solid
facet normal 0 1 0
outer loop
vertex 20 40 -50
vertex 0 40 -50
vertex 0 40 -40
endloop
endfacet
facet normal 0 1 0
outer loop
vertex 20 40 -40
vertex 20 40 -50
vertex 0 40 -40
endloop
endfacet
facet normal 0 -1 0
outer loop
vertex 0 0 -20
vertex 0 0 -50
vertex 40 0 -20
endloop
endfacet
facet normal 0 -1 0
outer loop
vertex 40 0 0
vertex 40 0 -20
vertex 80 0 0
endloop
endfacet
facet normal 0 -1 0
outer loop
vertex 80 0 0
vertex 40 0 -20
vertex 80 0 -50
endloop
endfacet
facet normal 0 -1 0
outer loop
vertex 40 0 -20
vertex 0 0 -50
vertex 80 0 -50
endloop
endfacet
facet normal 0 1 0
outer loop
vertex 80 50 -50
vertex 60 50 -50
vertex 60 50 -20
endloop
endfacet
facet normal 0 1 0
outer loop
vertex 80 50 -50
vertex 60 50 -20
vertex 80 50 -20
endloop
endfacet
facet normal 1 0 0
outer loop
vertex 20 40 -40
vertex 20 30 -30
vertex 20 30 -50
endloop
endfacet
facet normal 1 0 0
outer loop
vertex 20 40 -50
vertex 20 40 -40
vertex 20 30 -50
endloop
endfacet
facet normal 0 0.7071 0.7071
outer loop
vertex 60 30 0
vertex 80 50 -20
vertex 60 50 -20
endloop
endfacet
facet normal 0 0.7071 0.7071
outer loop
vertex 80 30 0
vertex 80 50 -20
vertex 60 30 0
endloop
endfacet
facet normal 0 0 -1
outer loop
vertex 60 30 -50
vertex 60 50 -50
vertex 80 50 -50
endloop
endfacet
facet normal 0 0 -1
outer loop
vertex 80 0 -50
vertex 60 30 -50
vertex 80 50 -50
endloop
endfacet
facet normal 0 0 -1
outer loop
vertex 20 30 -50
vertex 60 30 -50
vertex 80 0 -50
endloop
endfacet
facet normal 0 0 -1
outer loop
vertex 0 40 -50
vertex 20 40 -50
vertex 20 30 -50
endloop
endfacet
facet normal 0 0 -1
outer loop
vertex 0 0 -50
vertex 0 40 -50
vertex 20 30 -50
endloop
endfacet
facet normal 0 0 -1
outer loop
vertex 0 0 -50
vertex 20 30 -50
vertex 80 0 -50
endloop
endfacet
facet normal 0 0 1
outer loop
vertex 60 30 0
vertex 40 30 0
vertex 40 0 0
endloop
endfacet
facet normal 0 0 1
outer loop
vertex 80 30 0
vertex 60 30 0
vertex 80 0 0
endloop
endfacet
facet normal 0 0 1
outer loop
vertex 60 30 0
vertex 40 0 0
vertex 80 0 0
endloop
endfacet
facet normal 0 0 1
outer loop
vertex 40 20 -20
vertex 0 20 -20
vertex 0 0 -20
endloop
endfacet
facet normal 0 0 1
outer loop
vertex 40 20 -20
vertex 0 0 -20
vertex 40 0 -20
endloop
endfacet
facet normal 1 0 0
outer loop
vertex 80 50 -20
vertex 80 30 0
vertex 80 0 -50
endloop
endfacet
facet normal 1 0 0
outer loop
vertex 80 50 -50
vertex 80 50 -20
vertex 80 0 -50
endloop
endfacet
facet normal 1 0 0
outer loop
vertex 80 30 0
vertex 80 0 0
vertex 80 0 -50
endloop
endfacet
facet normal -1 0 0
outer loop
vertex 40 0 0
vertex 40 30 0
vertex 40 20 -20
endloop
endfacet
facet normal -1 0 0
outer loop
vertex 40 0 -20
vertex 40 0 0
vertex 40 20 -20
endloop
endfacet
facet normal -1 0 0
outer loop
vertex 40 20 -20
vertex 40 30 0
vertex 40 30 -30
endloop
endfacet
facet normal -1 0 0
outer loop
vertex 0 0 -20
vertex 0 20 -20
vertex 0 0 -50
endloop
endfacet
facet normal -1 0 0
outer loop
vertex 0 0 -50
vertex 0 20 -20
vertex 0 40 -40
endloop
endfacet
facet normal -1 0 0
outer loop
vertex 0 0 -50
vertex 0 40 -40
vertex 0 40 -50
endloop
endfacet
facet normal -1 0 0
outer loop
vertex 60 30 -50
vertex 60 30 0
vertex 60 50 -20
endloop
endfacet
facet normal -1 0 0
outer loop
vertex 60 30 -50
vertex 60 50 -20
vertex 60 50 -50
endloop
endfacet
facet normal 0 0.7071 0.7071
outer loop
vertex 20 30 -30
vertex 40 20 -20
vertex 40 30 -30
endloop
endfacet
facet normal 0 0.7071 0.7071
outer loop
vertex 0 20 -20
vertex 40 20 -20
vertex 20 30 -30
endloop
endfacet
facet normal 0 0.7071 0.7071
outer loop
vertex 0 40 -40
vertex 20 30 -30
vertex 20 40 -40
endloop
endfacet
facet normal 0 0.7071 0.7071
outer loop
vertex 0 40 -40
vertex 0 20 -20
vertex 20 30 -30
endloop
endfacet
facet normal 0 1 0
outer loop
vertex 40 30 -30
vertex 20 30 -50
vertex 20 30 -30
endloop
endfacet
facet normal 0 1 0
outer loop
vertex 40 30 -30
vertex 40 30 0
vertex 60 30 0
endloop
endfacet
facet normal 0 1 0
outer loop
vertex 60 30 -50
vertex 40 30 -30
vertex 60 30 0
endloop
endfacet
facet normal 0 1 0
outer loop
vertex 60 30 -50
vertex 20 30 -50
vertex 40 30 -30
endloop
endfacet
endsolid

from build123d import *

# Parameters (mm, degrees)
SKETCH1_W           = 80
SKETCH1_H           = 50
BOSS_EXTRUDE1_DEPTH = 30
SKETCH2_W           = 40
SKETCH2_H           = 20
CUT_EXTRUDE1_DEPTH  = 30
SKETCH3_W           = 20
SKETCH3_H           = 50
BOSS_EXTRUDE2_DEPTH = 20
CUT_EXTRUDE2_DEPTH  = 20
CUT_EXTRUDE4_DEPTH  = 40
BOSS_EXTRUDE3_DEPTH = 20


with BuildPart() as part:
    # Sketch1 → Boss-Extrude1 (new body)
    with BuildSketch(Plane(origin=(0, 0, 0), x_dir=(1, 0, 0), z_dir=(0, 1, 0))):
        with Locations((40, 25)):
            Rectangle(SKETCH1_W, SKETCH1_H)
    extrude(amount=BOSS_EXTRUDE1_DEPTH)

    # Sketch2 → Cut-Extrude1 (cut)
    with BuildSketch(Plane(origin=(0, 30, 0), x_dir=(1, 0, 0), z_dir=(0, 1, 0))):
        with Locations((20, 10)):
            Rectangle(SKETCH2_W, SKETCH2_H)
    extrude(amount=-CUT_EXTRUDE1_DEPTH, mode=Mode.SUBTRACT)

    # Sketch3 → Boss-Extrude2 (add)
    with BuildSketch(Plane(origin=(0, 30, 0), x_dir=(1, 0, 0), z_dir=(0, 1, 0))):
        with Locations((70, 25)):
            Rectangle(SKETCH3_W, SKETCH3_H)
    extrude(amount=BOSS_EXTRUDE2_DEPTH)

    # Sketch4 → Cut-Extrude2 (cut)
    with BuildSketch(Plane(origin=(80, 0, 0), x_dir=(0, 0, -1), z_dir=(1, 0, 0))):
        Polygon((20, 50), (0, 30), (0, 50), align=None)
    extrude(amount=-CUT_EXTRUDE2_DEPTH, mode=Mode.SUBTRACT)

    # Sketch5 → Cut-Extrude4 (cut)
    with BuildSketch(Plane.ZY):
        Polygon((-30, 30), (-20, 20), (-20, 30), align=None)
    extrude(amount=-CUT_EXTRUDE4_DEPTH, mode=Mode.SUBTRACT)

    # Sketch6 → Boss-Extrude3 (add)
    with BuildSketch(Plane.ZY):
        Polygon((-50, 30), (-50, 40), (-40, 40), (-30, 30), (-20, 20), (-20, 0), (-50, 0), align=None)
    extrude(amount=-BOSS_EXTRUDE3_DEPTH)


solid = part.part
